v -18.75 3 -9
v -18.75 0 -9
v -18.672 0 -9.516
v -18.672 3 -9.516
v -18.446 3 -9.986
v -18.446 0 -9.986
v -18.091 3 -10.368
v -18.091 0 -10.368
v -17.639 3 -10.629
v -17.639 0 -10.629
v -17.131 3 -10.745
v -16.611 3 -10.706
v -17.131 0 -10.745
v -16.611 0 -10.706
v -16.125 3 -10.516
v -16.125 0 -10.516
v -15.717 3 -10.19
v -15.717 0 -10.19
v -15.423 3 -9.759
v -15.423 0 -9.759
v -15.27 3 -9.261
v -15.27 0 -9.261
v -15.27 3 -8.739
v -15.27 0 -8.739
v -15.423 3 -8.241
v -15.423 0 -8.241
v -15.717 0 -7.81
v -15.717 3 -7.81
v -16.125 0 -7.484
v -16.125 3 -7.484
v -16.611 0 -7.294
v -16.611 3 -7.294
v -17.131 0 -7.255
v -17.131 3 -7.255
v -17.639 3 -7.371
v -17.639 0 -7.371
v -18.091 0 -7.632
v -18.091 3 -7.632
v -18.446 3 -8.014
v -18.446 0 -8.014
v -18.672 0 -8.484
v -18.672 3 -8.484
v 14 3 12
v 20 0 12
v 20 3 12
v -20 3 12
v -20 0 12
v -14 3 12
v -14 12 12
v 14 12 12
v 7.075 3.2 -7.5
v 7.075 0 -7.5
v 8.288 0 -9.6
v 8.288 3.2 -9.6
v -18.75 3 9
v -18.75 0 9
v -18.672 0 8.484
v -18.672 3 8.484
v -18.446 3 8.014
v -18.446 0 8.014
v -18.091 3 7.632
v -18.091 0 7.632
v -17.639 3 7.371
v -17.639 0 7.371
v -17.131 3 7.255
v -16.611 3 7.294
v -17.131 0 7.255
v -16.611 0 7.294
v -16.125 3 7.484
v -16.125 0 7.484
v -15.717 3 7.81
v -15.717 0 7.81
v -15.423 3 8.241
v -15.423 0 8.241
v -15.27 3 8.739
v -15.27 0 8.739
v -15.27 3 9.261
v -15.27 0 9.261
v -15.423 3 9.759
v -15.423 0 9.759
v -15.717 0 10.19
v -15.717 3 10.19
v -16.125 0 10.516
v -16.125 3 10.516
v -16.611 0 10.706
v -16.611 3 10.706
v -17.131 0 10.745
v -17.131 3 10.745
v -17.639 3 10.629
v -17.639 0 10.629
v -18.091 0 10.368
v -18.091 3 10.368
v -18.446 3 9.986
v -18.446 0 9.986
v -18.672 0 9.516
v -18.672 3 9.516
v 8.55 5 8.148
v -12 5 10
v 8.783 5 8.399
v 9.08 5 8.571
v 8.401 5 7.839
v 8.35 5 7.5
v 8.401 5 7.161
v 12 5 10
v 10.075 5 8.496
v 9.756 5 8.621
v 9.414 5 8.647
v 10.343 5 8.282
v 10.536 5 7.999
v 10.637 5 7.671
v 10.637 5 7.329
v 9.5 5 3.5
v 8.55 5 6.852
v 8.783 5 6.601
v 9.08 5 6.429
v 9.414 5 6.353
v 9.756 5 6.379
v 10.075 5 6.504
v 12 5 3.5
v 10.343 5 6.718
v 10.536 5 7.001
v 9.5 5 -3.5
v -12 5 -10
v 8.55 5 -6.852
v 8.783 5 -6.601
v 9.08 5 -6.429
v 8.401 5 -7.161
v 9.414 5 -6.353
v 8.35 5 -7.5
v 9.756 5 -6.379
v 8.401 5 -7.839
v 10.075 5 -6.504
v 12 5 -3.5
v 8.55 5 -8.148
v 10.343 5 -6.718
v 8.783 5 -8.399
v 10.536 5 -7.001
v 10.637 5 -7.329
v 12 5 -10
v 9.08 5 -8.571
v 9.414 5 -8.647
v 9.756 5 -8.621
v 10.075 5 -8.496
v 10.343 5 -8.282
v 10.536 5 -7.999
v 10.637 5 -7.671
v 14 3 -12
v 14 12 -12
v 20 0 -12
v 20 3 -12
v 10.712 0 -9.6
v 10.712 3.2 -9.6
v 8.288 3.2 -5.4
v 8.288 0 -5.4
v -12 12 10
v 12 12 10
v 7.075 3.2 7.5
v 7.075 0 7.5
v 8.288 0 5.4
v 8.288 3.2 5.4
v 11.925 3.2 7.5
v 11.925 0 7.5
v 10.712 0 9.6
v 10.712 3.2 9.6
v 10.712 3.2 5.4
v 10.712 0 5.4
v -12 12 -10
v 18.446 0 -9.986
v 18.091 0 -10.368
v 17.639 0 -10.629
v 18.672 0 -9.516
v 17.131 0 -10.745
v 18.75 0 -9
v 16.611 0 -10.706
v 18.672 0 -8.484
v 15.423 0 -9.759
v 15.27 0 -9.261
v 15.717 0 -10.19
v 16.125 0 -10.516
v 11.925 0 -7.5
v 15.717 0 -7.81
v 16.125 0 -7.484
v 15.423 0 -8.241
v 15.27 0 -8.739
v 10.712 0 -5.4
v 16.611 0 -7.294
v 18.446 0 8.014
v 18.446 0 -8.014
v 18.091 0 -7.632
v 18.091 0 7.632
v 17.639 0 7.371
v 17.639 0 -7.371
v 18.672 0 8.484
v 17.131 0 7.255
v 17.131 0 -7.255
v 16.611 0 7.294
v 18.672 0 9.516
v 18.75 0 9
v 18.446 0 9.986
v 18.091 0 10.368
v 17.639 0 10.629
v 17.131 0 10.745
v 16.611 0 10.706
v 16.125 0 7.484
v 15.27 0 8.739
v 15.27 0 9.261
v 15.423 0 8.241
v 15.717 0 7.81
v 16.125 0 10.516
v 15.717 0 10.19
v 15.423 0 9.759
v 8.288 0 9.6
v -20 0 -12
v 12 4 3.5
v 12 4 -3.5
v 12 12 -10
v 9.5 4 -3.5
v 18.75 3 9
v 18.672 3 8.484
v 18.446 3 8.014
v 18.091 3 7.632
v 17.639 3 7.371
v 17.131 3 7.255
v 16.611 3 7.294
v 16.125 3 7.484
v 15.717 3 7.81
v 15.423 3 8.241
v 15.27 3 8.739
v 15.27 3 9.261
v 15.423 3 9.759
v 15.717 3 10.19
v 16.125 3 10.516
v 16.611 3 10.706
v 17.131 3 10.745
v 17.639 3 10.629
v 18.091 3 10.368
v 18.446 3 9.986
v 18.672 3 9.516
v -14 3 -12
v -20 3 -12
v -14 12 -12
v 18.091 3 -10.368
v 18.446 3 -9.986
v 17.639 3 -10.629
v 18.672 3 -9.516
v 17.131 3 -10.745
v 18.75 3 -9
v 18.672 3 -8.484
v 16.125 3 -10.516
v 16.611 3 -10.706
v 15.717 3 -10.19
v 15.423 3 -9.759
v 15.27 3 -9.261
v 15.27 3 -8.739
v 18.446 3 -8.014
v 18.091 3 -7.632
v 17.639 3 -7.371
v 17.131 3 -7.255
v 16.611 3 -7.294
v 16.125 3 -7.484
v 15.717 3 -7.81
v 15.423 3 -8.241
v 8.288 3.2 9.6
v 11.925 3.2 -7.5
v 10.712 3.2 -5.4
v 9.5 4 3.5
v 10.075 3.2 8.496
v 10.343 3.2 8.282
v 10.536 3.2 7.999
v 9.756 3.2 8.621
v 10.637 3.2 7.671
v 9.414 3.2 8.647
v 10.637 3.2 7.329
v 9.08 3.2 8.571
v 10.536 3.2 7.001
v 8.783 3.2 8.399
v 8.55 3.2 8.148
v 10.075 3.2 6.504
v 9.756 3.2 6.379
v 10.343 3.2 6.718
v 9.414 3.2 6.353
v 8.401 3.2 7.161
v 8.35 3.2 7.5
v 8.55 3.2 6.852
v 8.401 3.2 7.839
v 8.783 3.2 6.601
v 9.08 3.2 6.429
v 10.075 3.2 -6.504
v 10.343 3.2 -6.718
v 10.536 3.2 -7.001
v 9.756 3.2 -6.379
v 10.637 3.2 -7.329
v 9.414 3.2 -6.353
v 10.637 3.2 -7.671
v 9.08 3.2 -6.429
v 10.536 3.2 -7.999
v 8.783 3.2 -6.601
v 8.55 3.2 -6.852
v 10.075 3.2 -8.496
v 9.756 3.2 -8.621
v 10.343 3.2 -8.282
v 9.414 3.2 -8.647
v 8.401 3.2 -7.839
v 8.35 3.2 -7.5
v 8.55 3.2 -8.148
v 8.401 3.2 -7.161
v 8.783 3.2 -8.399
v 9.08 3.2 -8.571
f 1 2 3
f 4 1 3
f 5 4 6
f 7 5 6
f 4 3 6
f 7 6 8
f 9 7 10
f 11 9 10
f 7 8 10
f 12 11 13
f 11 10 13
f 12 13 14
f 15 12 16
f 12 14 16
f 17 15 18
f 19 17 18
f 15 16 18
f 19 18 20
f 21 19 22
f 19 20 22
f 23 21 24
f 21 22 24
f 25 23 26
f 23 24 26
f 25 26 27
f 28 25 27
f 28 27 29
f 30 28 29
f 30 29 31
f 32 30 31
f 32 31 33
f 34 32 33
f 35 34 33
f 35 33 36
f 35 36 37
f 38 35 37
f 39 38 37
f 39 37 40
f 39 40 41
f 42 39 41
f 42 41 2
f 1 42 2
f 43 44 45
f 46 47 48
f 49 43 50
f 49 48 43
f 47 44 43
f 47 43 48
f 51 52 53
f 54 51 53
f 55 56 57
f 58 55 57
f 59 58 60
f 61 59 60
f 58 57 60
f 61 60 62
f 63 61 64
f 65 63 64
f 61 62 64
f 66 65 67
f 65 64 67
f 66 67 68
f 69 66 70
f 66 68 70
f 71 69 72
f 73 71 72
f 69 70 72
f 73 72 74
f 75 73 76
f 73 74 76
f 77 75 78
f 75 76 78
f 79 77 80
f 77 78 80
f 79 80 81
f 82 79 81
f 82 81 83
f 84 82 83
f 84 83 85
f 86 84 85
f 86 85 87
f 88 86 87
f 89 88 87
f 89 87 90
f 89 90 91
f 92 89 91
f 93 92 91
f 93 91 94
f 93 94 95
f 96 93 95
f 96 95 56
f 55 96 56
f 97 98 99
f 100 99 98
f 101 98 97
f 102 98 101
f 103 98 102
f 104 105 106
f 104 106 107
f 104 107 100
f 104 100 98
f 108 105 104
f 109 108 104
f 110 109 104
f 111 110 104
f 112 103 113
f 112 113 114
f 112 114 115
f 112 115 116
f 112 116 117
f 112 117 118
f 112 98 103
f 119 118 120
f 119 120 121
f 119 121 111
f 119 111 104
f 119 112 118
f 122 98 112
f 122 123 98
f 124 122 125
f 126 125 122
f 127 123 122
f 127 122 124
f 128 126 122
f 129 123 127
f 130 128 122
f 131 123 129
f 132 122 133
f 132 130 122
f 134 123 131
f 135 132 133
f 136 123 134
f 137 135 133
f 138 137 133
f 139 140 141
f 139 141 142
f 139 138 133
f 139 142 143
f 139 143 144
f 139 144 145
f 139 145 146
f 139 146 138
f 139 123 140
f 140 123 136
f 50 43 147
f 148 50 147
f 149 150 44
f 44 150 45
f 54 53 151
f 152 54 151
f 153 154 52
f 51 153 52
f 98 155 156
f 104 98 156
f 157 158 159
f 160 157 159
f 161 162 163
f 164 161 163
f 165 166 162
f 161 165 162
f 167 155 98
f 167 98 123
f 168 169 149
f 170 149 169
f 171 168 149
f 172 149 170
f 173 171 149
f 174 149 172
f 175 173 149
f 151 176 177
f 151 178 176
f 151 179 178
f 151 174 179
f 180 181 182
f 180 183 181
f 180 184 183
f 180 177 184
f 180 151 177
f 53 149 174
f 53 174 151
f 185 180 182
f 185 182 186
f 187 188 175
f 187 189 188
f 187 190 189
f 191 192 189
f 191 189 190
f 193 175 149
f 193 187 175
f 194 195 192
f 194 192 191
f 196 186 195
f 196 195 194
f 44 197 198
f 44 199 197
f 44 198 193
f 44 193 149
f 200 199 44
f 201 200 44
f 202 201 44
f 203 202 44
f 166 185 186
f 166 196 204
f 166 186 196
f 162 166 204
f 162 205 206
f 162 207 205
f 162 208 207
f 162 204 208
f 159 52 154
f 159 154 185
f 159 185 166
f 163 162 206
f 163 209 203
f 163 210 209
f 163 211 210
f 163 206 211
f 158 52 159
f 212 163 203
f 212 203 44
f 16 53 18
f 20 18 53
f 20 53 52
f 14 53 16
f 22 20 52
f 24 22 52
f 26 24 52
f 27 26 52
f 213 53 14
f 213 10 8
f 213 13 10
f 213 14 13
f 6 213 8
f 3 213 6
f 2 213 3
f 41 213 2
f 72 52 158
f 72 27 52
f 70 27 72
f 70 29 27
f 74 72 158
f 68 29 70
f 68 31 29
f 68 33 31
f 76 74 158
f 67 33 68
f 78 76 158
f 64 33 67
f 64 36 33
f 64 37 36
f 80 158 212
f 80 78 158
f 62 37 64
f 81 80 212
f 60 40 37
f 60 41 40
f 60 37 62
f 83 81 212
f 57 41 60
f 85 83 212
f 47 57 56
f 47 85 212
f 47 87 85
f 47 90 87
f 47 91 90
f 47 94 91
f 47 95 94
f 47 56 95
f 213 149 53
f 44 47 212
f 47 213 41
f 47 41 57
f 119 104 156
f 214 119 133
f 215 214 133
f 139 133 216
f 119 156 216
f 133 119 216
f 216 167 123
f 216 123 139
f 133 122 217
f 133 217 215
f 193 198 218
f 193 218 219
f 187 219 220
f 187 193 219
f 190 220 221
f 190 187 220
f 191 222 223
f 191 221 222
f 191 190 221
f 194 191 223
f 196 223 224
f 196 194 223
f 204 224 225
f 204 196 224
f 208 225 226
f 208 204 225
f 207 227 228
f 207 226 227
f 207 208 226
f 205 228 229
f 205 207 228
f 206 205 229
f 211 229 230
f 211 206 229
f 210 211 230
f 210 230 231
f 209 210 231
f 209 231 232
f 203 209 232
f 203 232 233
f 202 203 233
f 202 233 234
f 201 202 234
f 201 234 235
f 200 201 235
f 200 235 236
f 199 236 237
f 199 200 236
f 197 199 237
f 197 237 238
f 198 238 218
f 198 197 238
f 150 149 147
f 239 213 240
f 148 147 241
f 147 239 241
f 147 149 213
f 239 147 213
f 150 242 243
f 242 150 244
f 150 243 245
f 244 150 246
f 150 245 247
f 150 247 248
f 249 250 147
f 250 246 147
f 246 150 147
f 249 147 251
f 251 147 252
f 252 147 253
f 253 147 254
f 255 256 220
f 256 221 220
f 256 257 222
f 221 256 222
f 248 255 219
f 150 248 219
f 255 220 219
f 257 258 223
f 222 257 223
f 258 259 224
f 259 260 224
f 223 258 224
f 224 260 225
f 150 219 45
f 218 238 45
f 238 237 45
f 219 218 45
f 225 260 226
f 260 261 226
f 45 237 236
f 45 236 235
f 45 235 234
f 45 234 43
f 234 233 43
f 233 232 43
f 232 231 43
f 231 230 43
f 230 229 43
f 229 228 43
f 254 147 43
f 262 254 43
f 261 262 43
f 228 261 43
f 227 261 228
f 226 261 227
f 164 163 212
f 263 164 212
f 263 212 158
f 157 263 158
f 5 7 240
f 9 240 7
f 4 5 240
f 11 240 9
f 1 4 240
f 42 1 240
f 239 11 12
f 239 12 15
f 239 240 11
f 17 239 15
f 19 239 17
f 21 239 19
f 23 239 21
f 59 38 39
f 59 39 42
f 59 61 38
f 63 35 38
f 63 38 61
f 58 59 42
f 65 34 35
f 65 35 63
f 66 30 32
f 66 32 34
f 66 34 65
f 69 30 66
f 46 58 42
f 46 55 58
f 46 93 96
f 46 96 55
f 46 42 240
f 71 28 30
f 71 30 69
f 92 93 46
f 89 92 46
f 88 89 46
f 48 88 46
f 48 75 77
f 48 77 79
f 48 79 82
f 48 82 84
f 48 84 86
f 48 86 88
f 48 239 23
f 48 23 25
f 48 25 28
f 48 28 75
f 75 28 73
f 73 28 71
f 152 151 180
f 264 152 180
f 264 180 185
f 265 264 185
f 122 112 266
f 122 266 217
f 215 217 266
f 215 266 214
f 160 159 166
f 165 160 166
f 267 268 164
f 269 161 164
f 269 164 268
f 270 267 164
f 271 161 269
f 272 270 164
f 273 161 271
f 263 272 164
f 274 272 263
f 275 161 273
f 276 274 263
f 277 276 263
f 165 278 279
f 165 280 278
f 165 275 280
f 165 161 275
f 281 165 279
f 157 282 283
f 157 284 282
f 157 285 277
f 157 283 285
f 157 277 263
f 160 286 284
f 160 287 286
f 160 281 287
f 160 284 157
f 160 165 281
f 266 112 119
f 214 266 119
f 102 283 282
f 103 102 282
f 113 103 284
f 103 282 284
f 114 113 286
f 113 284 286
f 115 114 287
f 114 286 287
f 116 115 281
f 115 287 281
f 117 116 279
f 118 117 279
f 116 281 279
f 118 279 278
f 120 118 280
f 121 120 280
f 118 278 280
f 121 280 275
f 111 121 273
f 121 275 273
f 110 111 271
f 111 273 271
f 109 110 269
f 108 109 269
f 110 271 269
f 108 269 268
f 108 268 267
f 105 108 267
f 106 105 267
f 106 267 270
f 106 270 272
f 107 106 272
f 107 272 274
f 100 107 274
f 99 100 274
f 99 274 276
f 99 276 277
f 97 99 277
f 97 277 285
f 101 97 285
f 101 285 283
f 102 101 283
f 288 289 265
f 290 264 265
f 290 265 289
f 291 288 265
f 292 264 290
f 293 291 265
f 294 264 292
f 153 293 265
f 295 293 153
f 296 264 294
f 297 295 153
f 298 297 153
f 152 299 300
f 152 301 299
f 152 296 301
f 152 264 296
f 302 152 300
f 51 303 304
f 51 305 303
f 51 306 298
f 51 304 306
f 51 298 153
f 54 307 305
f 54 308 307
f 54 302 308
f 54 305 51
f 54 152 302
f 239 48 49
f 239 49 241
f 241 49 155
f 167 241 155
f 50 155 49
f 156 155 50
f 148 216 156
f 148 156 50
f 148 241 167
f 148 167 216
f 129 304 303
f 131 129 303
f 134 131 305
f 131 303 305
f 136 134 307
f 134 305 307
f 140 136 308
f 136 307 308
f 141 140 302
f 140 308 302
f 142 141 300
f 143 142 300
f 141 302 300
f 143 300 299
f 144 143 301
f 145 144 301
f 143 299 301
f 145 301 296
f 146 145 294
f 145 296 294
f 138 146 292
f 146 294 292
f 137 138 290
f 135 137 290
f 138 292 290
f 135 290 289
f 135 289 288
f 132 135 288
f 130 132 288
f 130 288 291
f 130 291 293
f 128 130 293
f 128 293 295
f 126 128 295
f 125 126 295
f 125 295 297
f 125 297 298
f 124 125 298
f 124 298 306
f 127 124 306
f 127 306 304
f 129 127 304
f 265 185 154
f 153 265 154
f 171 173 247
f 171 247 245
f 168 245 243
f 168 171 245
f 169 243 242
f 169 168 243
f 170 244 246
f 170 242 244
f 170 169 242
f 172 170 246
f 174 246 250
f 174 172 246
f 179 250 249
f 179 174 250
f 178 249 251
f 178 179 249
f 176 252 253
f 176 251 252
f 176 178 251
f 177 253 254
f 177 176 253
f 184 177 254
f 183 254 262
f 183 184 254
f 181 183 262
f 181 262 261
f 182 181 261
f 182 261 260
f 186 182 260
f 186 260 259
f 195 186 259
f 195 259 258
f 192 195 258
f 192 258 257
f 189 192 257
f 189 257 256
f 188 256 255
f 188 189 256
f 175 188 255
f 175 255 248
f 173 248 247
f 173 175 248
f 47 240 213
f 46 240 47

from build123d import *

# Parameters (mm, degrees)
SKETCH_1_W          = 28
SKETCH_1_H          = 24
EXTRUDE_2_DEPTH     = 12
SKETCH_2_W          = 24
SKETCH_2_H          = 20
CUT_EXTRUDE_1_DEPTH = 7
SKETCH_3_W          = 24
SKETCH_3_H          = 3
EXTRUDE_4_DEPTH     = 6
HOLE_WIZARD_1_D     = 3.5
HOLE_WIZARD_2_D     = 2.3
SKETCH_10_W         = 2.5
SKETCH_10_H         = 7
CUT_EXTRUDE_2_DEPTH = 1
CUT_EXTRUDE_3_DEPTH = 3.2


with BuildPart() as part:
    # 草图1 → 凸台-拉伸2 (new body)
    with BuildSketch(Plane(origin=(0, 0, 0), x_dir=(1, 0, 0), z_dir=(0, 1, 0))):
        Rectangle(SKETCH_1_W, SKETCH_1_H)
    extrude(amount=EXTRUDE_2_DEPTH)

    # 草图2 → 切除-拉伸1 (cut)
    with BuildSketch(Plane(origin=(0, 12, 0), x_dir=(1, 0, 0), z_dir=(0, 1, 0))):
        Rectangle(SKETCH_2_W, SKETCH_2_H)
    extrude(amount=-CUT_EXTRUDE_1_DEPTH, mode=Mode.SUBTRACT)

    # 草图3 → 凸台-拉伸4 (add)
    with BuildSketch(Plane.ZY.offset(14)):
        with Locations((0, 1.5)):
            Rectangle(SKETCH_3_W, SKETCH_3_H)
    extrude_4 = extrude(amount=EXTRUDE_4_DEPTH)

    # 孔1 (through all)
    with Locations(Plane(origin=(0, 3, 0), x_dir=(1, 0, 0), z_dir=(0, 1, 0))):
        with Locations((-17, 9), (-17, -9)):
            hole_wizard_1 = Hole(HOLE_WIZARD_1_D / 2)

    # 镜向1: 凸台-拉伸4, 孔1 across plane
    add(extrude_4.mirror(Plane.ZY))
    add(hole_wizard_1.mirror(Plane.ZY), mode=Mode.SUBTRACT)

    # 孔2 (through all)
    with Locations(Plane(origin=(0, 5, 0), x_dir=(1, 0, 0), z_dir=(0, 1, 0))):
        with Locations((9.5, 7.5), (9.5, -7.5)):
            Hole(HOLE_WIZARD_2_D / 2)

    # 草图10 → 切除-拉伸2 (cut)
    with BuildSketch(Plane(origin=(0, 5, 0), x_dir=(1, 0, 0), z_dir=(0, 1, 0))):
        with Locations((10.75, 0)):
            Rectangle(SKETCH_10_W, SKETCH_10_H)
    extrude(amount=-CUT_EXTRUDE_2_DEPTH, mode=Mode.SUBTRACT)

    # 草图11 → 切除-拉伸3 (cut)
    with BuildSketch(Plane(origin=(0, 0, 0), x_dir=(-1, 0, 0), z_dir=(0, -1, 0))):
        Polygon((-11.924871131, -7.5), (-10.712435565, -9.6), (-8.287564435, -9.6), (-7.075128869, -7.5), (-8.287564435, -5.4), (-10.712435565, -5.4), align=None)
        Polygon((-11.924871131, 7.5), (-10.712435565, 5.4), (-8.287564435, 5.4), (-7.075128869, 7.5), (-8.287564435, 9.6), (-10.712435565, 9.6), align=None)
    extrude(amount=-CUT_EXTRUDE_3_DEPTH, mode=Mode.SUBTRACT)


solid = part.part
